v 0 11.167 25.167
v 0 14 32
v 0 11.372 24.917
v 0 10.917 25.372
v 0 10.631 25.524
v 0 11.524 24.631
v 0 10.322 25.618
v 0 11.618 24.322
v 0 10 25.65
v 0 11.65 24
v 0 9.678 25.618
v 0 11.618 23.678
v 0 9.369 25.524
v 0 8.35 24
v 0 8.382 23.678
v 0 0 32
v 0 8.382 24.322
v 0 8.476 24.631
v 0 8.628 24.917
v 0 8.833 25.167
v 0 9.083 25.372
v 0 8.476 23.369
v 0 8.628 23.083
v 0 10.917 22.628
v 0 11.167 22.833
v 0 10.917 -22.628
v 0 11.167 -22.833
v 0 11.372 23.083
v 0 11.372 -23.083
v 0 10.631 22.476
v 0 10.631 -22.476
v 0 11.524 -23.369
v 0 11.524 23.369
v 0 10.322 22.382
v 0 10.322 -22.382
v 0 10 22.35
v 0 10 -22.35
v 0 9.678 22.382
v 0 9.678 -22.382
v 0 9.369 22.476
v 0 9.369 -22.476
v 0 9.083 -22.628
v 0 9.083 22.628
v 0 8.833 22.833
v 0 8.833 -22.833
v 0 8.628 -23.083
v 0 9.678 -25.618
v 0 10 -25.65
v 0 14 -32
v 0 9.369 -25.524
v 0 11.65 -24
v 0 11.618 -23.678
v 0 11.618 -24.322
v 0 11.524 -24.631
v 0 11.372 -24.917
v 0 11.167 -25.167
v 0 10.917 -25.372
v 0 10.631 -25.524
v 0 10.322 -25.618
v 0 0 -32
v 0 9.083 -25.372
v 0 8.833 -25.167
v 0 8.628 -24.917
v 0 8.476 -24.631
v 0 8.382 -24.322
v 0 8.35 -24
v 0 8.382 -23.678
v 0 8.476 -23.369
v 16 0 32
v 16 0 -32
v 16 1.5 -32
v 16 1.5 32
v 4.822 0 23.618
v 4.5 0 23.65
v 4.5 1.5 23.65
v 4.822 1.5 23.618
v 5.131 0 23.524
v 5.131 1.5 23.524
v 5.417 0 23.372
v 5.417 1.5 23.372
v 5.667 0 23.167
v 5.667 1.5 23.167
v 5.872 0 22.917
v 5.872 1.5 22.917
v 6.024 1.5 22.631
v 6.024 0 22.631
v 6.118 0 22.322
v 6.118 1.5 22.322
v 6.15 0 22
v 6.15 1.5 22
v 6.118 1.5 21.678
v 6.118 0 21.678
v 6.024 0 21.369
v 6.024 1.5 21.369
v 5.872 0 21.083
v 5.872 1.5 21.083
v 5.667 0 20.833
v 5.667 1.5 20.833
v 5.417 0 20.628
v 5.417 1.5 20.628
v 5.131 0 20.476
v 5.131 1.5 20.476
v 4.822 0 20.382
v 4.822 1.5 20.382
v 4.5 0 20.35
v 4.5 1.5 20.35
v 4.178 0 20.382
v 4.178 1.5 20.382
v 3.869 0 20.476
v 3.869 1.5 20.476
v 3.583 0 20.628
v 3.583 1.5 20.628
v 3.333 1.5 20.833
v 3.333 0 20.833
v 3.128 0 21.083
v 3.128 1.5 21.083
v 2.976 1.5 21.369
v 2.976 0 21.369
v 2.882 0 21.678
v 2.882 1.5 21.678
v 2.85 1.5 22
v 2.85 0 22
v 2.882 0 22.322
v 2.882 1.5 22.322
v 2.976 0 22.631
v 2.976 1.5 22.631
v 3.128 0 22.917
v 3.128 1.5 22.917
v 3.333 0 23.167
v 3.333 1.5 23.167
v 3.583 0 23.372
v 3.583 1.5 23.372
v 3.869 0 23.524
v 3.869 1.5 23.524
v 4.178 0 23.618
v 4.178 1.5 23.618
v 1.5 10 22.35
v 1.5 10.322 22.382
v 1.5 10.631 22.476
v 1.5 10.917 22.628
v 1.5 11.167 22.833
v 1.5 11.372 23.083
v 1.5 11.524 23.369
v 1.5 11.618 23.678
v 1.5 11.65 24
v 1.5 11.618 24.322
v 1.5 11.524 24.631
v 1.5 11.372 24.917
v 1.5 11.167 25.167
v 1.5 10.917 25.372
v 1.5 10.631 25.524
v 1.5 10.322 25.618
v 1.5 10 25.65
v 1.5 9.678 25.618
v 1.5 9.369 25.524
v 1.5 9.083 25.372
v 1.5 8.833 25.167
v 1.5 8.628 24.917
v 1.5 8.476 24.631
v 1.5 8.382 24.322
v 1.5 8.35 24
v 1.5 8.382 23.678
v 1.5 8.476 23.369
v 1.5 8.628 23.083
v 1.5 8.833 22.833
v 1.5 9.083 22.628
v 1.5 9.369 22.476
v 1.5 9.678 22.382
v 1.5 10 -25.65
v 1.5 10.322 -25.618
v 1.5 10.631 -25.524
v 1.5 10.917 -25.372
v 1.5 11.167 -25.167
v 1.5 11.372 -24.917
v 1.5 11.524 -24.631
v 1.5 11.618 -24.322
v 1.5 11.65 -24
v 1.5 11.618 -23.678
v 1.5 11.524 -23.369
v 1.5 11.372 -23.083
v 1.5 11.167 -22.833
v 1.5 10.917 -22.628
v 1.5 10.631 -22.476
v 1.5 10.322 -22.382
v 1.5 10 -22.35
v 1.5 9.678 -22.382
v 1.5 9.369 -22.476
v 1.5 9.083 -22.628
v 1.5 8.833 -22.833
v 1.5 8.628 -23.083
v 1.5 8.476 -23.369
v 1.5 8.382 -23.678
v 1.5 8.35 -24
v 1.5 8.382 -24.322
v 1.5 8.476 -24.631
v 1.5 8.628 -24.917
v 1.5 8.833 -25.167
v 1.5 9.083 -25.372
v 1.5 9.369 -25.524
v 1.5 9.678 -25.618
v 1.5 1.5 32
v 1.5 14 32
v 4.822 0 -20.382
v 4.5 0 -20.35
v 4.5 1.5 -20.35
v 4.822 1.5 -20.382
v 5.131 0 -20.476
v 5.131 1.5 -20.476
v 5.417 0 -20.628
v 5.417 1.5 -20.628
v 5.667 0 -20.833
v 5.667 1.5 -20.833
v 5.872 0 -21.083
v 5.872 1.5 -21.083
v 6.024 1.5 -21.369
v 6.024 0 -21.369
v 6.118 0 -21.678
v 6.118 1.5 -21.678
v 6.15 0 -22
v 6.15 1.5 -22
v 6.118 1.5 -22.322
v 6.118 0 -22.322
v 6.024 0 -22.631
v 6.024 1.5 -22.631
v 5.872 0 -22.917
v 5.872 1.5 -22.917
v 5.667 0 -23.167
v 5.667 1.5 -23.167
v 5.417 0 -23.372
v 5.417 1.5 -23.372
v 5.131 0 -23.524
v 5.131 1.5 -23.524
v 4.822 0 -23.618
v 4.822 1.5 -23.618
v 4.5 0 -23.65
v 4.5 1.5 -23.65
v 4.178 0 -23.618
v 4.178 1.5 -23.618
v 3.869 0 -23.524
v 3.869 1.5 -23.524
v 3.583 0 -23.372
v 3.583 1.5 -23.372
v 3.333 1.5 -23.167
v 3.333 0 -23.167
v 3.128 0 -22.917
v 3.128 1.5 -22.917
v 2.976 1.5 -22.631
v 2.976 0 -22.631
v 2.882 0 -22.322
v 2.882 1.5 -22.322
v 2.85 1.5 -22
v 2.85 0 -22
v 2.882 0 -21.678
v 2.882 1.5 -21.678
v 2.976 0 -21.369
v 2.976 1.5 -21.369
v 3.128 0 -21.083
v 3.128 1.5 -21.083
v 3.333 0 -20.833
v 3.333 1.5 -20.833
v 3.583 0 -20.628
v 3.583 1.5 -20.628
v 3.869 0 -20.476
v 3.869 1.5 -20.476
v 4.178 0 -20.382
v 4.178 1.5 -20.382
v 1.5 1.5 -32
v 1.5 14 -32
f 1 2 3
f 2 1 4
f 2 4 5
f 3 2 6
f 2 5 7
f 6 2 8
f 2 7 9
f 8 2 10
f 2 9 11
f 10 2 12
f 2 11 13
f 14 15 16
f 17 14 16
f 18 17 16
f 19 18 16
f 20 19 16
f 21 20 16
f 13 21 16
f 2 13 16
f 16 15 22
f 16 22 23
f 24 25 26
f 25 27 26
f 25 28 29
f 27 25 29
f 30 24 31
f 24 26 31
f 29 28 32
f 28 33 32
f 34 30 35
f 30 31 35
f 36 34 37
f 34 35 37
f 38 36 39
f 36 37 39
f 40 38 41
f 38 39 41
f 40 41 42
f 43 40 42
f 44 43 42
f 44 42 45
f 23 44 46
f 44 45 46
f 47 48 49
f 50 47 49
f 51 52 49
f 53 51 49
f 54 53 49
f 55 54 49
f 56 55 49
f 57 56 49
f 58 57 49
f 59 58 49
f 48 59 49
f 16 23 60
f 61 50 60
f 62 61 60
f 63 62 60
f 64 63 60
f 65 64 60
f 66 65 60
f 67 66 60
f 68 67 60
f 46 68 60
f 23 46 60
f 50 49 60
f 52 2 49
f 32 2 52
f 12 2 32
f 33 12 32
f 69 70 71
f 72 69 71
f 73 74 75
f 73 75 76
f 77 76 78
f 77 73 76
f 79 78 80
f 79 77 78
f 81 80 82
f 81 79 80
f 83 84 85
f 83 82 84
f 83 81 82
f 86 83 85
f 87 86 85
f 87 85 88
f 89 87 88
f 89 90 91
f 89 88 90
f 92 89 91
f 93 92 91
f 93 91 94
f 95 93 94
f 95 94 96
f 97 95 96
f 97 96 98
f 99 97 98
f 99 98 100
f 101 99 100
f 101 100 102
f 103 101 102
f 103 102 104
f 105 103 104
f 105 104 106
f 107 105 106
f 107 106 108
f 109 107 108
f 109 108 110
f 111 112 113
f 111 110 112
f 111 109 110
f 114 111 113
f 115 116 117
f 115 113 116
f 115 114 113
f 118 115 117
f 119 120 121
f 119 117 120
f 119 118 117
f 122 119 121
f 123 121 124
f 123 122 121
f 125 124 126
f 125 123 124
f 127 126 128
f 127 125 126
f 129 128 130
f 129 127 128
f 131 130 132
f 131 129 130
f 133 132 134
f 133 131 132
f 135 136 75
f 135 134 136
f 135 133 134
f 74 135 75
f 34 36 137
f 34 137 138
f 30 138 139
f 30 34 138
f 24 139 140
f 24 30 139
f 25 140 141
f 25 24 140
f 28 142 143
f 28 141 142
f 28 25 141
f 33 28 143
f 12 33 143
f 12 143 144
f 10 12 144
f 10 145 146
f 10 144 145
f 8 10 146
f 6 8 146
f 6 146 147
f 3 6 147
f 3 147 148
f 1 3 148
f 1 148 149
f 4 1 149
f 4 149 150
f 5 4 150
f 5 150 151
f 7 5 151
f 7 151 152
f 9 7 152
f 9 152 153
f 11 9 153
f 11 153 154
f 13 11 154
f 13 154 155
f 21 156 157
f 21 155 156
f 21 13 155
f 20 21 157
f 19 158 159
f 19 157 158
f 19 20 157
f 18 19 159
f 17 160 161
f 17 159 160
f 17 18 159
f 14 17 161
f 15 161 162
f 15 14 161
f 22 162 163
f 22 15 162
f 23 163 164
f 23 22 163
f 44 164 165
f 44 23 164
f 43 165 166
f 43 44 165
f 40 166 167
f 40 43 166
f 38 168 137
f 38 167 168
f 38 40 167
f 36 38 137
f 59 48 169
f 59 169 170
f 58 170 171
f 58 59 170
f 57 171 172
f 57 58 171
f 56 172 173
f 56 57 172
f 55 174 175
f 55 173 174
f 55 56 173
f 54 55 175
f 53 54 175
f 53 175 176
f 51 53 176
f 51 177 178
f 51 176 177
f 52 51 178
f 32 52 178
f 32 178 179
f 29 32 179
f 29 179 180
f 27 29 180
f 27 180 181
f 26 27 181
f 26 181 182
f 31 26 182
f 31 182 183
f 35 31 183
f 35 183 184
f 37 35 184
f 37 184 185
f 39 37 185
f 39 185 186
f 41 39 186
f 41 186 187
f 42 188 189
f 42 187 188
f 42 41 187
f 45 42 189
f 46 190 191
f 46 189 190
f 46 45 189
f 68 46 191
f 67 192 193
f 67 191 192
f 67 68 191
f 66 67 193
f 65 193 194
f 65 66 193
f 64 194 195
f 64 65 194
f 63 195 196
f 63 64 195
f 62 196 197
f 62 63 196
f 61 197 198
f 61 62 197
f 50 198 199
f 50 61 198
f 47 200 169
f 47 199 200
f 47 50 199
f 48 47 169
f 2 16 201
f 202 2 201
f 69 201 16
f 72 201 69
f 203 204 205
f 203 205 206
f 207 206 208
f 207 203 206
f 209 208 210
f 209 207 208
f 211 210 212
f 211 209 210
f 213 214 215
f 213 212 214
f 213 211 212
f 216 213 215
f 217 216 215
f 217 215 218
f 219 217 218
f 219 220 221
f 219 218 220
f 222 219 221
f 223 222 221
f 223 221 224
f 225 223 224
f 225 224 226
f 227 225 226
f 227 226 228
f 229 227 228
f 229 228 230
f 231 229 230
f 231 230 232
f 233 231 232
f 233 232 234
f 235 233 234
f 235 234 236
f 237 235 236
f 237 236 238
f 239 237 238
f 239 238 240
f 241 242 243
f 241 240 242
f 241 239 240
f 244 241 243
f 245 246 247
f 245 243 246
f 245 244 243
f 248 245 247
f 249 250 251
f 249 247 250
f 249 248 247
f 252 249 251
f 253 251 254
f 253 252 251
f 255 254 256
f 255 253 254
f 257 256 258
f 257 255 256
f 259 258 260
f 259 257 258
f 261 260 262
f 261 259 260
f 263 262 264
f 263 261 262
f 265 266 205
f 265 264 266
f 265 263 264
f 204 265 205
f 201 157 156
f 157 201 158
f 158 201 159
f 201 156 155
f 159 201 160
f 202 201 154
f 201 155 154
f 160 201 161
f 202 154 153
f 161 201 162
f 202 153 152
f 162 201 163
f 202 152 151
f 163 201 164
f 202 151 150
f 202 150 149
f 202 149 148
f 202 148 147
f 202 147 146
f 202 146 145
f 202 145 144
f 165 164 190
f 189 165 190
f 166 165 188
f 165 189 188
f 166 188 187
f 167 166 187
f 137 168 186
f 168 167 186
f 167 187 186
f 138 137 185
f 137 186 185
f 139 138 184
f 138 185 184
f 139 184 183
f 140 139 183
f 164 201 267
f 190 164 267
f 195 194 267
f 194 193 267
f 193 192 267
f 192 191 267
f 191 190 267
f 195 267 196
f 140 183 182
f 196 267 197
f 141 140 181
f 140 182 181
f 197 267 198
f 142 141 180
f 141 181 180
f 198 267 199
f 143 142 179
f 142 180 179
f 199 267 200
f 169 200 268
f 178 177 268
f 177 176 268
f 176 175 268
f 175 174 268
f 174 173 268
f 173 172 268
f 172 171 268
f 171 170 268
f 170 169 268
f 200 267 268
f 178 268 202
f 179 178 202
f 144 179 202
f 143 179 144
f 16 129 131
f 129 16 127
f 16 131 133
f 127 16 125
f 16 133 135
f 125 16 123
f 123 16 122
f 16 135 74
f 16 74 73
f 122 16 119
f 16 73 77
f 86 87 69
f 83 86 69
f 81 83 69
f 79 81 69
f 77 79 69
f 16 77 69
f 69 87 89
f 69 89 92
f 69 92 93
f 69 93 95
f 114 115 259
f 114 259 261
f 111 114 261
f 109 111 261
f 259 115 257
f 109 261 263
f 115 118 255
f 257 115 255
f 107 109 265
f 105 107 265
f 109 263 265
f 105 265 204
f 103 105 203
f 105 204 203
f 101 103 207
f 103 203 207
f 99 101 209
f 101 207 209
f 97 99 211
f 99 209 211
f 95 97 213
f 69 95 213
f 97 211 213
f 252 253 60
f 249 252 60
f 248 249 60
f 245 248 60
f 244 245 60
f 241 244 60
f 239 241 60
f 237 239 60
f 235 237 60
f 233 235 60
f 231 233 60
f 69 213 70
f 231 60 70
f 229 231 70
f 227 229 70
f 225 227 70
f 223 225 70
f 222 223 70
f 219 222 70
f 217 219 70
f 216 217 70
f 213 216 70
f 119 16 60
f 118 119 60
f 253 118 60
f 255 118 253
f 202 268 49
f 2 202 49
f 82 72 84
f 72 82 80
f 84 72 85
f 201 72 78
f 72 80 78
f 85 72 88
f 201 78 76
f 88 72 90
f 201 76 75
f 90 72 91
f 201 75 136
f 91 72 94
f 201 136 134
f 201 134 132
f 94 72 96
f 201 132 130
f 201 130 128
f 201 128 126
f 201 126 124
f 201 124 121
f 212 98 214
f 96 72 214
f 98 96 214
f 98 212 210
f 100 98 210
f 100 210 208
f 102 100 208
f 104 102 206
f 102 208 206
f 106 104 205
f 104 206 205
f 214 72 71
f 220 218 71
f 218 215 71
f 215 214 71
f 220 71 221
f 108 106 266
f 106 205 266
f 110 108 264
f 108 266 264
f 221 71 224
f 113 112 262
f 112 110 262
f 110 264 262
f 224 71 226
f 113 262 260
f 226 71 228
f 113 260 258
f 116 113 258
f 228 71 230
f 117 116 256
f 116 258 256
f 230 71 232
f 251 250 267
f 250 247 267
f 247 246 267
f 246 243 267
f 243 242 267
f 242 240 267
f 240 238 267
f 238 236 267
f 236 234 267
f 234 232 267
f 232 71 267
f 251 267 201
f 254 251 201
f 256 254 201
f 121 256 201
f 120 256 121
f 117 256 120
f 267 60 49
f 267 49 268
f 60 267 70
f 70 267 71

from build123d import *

# Parameters (mm, degrees)
F_1P5MM_64_START              = -32
F_1P5MM_64_DEPTH              = 64
CUT_EXTRUDE_M3_1_DEPTH        = 100
CUT_EXTRUDE_M3_1_DEPTH_BACK   = 100
SKETCH_2_R                    = 1.65
CUT_EXTRUDE_M3_1_2_DEPTH      = 100
CUT_EXTRUDE_M3_1_2_DEPTH_BACK = 100
SKETCH_3_R                    = 1.65
CUT_EXTRUDE_M3_1_3_DEPTH      = 100
CUT_EXTRUDE_M3_1_3_DEPTH_BACK = 100
SKETCH_4_R                    = 1.65
CUT_EXTRUDE_M3_1_4_DEPTH      = 100
CUT_EXTRUDE_M3_1_4_DEPTH_BACK = 100
SKETCH_5_R                    = 1.65


with BuildPart() as part:
    # 草图1 → 1p5mm铝合金直角座_宽64 (new body)
    with BuildSketch(Plane.XY.offset(F_1P5MM_64_START)):
        Polygon((0, 0), (16, 0), (16, 1.5), (1.5, 1.5), (1.5, 14), (0, 14), align=None)
    extrude(amount=F_1P5MM_64_DEPTH)

    # 草图2 → Cut-Extrude M3_-1 (cut, two sides: drawn at the far end of the back side and taken through both)
    with BuildSketch(Plane(origin=(0, 0, 0), x_dir=(0, 0, -1), z_dir=(1, 0, 0)).offset(-CUT_EXTRUDE_M3_1_DEPTH_BACK)):
        with Locations((24, 10)):
            Circle(SKETCH_2_R)
    extrude(amount=CUT_EXTRUDE_M3_1_DEPTH + CUT_EXTRUDE_M3_1_DEPTH_BACK, mode=Mode.SUBTRACT)

    # 草图3 → Cut-Extrude M3_-1 2 (cut, two sides: drawn at the far end of the back side and taken through both)
    with BuildSketch(Plane(origin=(0, 0, 0), x_dir=(1, 0, 0), z_dir=(0, 1, 0)).offset(-CUT_EXTRUDE_M3_1_2_DEPTH_BACK)):
        with Locations(Location((4.5, 22, 0), (0, 0, 270))):
            Circle(SKETCH_3_R)
    extrude(amount=CUT_EXTRUDE_M3_1_2_DEPTH + CUT_EXTRUDE_M3_1_2_DEPTH_BACK, mode=Mode.SUBTRACT)

    # 草图4 → Cut-Extrude M3_1 3 (cut, two sides: drawn at the far end of the back side and taken through both)
    with BuildSketch(Plane(origin=(0, 0, 0), x_dir=(0, 0, -1), z_dir=(1, 0, 0)).offset(-CUT_EXTRUDE_M3_1_3_DEPTH_BACK)):
        with Locations((-24, 10)):
            Circle(SKETCH_4_R)
    extrude(amount=CUT_EXTRUDE_M3_1_3_DEPTH + CUT_EXTRUDE_M3_1_3_DEPTH_BACK, mode=Mode.SUBTRACT)

    # 草图5 → Cut-Extrude M3_1 4 (cut, two sides: drawn at the far end of the back side and taken through both)
    with BuildSketch(Plane(origin=(0, 0, 0), x_dir=(1, 0, 0), z_dir=(0, 1, 0)).offset(-CUT_EXTRUDE_M3_1_4_DEPTH_BACK)):
        with Locations(Location((4.5, -22, 0), (0, 0, 270))):
            Circle(SKETCH_5_R)
    extrude(amount=CUT_EXTRUDE_M3_1_4_DEPTH + CUT_EXTRUDE_M3_1_4_DEPTH_BACK, mode=Mode.SUBTRACT)


solid = part.part
